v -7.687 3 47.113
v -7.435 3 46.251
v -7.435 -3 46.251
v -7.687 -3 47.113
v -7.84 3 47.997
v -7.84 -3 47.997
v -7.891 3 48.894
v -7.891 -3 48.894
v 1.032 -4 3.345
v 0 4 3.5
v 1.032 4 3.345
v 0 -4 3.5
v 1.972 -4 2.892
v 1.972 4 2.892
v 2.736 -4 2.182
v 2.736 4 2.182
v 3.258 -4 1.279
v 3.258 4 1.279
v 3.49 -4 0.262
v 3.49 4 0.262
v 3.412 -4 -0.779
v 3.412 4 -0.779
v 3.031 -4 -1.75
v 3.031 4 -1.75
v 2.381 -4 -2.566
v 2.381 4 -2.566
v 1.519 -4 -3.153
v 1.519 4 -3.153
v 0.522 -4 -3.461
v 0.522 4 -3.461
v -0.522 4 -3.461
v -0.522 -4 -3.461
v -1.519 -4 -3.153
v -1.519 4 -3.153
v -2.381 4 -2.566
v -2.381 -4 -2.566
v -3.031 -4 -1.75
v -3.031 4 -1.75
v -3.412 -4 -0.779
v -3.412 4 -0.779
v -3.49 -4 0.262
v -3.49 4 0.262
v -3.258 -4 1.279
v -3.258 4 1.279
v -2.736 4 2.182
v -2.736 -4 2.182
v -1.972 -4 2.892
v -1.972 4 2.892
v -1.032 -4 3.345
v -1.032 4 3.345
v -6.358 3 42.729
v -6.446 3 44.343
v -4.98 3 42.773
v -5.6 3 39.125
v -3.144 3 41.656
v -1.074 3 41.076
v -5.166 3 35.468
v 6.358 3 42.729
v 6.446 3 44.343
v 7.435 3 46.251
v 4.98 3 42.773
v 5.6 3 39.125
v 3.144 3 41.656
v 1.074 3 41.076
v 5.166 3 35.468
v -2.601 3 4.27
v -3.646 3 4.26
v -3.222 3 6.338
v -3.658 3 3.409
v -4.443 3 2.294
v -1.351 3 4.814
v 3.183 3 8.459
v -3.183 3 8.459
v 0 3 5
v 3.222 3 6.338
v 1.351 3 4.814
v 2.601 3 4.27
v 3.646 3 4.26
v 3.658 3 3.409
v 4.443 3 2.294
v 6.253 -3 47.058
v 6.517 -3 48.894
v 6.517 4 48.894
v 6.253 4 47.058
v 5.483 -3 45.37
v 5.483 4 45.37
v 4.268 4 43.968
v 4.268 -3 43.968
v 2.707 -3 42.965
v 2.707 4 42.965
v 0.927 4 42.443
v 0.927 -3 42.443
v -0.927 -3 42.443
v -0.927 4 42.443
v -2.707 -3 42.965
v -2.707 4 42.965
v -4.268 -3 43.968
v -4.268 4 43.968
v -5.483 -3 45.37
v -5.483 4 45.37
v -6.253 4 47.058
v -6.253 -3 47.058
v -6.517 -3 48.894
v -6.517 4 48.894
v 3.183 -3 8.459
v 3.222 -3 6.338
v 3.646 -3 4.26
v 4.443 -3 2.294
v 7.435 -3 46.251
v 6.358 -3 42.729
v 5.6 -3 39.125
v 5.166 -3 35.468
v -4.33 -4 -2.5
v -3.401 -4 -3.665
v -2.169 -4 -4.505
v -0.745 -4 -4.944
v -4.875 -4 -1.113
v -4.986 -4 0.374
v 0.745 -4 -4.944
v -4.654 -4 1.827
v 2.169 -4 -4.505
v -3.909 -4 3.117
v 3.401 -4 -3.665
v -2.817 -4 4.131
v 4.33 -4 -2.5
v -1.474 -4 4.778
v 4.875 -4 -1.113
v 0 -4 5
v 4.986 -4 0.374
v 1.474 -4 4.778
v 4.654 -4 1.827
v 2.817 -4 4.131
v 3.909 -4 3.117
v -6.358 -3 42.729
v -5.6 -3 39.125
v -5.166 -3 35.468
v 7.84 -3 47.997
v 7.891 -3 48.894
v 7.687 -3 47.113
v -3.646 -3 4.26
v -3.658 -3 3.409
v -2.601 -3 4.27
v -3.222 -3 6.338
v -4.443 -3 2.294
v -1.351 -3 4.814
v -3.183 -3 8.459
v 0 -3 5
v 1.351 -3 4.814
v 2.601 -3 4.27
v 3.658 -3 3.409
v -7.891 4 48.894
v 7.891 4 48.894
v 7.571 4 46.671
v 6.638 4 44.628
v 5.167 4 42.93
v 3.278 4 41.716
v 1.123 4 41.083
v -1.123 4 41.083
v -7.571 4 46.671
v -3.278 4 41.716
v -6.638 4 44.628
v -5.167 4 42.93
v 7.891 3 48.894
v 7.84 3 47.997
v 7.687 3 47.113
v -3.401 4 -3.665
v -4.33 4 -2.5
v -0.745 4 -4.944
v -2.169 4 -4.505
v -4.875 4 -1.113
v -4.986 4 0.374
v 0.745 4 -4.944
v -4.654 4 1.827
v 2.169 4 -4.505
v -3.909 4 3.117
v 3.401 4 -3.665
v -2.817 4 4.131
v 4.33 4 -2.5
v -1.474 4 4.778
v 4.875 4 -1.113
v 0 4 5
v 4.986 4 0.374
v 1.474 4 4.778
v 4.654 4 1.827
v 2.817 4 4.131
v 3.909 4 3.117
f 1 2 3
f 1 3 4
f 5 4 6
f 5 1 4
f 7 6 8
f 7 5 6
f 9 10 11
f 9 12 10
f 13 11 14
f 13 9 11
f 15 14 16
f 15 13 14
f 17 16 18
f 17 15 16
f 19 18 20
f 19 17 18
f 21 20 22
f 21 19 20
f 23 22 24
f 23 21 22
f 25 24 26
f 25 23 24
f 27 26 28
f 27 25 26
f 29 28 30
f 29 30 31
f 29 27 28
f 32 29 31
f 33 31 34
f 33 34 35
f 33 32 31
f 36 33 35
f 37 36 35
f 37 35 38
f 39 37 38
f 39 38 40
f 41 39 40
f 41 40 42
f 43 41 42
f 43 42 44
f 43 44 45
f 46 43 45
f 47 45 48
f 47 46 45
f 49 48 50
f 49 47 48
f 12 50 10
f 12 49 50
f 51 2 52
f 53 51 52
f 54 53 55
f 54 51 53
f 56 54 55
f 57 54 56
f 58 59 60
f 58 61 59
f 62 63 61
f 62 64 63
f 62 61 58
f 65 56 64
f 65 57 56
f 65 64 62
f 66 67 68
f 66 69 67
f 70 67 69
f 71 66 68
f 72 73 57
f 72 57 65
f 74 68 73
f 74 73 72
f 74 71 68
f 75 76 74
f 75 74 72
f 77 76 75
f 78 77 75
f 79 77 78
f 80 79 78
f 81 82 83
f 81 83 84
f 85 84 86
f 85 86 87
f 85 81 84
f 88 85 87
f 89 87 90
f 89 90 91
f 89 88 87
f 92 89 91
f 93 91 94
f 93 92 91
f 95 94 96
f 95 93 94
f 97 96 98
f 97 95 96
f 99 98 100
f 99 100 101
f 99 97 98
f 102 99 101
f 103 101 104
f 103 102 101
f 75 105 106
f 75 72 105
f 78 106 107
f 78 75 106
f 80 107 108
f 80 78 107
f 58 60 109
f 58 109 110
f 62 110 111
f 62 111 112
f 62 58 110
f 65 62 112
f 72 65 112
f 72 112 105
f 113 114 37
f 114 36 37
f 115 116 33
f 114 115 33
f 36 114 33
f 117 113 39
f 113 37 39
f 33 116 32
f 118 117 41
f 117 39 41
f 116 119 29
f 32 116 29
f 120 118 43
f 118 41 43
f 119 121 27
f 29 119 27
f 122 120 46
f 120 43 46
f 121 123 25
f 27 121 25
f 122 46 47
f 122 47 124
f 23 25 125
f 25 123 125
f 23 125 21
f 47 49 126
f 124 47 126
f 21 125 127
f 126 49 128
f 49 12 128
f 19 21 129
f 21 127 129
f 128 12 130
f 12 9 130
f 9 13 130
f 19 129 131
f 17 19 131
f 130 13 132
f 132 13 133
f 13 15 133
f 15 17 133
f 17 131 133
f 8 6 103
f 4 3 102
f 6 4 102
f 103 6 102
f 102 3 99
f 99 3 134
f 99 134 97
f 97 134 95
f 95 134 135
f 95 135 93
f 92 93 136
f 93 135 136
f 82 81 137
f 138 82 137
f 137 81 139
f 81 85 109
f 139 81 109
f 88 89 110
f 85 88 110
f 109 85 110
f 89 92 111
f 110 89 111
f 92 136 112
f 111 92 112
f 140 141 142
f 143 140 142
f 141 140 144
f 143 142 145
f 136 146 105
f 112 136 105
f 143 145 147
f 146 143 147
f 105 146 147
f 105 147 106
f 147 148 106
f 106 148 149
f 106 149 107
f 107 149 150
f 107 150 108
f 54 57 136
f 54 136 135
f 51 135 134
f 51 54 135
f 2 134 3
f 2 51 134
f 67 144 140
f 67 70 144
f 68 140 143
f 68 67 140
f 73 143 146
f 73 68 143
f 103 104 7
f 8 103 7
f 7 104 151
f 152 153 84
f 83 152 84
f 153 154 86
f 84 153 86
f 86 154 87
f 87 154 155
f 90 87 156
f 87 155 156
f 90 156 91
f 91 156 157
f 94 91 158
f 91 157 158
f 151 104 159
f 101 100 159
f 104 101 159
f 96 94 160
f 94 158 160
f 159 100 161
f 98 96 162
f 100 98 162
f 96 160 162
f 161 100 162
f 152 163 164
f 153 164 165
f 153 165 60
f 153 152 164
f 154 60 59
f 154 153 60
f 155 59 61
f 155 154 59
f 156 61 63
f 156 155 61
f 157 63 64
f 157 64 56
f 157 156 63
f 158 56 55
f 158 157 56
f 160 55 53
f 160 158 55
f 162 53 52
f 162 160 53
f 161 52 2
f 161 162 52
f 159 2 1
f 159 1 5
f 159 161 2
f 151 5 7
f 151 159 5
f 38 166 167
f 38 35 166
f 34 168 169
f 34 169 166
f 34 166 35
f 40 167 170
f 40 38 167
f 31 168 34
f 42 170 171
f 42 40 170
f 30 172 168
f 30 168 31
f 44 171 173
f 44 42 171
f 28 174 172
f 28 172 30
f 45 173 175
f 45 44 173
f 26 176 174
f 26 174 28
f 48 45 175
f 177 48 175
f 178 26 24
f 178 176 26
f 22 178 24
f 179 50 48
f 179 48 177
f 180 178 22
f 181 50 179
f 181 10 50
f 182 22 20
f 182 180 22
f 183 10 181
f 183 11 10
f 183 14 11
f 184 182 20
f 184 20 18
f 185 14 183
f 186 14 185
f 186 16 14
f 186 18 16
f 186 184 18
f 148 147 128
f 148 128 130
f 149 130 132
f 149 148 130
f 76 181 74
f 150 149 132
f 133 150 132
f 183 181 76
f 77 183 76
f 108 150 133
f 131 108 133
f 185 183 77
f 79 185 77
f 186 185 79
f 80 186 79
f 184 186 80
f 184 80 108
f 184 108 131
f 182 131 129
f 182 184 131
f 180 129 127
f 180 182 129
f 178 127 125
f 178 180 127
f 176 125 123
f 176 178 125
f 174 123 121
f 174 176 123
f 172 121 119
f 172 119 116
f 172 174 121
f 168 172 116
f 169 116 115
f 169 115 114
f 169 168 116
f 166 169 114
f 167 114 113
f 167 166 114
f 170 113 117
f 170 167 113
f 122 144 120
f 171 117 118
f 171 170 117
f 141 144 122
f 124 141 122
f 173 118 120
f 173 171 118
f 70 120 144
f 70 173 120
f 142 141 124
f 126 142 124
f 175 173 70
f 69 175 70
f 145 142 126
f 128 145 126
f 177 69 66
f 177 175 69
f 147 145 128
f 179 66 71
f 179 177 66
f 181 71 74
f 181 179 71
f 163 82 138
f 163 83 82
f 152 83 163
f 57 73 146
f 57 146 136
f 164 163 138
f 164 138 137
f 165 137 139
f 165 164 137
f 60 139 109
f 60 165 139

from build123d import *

# Parameters (mm, degrees)
SKETCH_1_R               = 5
SKETCH_1_R_2             = 3.5
EXTRUDE_1_DEPTH          = 4
EXTRUDE_2_DEPTH          = 3
CUT_EXTRUDE_1_DEPTH      = 51.018502827
CUT_EXTRUDE_1_DEPTH_BACK = 51.018502827
EXTRUDE_3_DEPTH          = 1


with BuildPart() as part:
    # 草图1 → 凸台-拉伸1 (new, symmetric)
    with BuildSketch(Plane(origin=(0, 0, 0), x_dir=(1, 0, 0), z_dir=(0, 1, 0))):
        Circle(SKETCH_1_R)
        Circle(SKETCH_1_R_2, mode=Mode.SUBTRACT)
    extrude(amount=EXTRUDE_1_DEPTH, both=True)

    # 草图3 → 凸台-拉伸2 (add, symmetric)
    with BuildSketch(Plane(origin=(0, 0, 0), x_dir=(1, 0, 0), z_dir=(0, 1, 0))):
        with BuildLine():
            ThreePointArc((-4.442907632, -2.293593637), (-3.386405493, -5.288949741), (-3.182744564, -8.45863067))
            Line((-3.182744564, -8.45863067), (-5.166007589, -35.46765597))
            ThreePointArc((-5.166007589, -35.46765597), (-5.938483862, -40.935577384), (-7.435049269, -46.251137201))
            ThreePointArc((-7.435049269, -46.251137201), (-7.775935141, -47.552891453), (-7.890676089, -48.893638195))
            Line((-7.890676089, -48.893638195), (7.890676089, -48.893638195))
            ThreePointArc((7.890676089, -48.893638195), (7.775935141, -47.552891453), (7.435049269, -46.251137201))
            ThreePointArc((7.435049269, -46.251137201), (5.938483862, -40.935577384), (5.166007589, -35.46765597))
            Line((5.166007589, -35.46765597), (3.182744564, -8.45863067))
            ThreePointArc((3.182744564, -8.45863067), (3.386405493, -5.288949741), (4.442907632, -2.293593637))
            ThreePointArc((4.442907632, -2.293593637), (0, -5), (-4.442907632, -2.293593637))
        make_face()
    extrude(amount=EXTRUDE_2_DEPTH, both=True)

    # 草图4 → 切除-拉伸1 (cut, two sides: drawn at the far end of the back side and taken through both)
    with BuildSketch(Plane(origin=(0, 3, 0), x_dir=(1, 0, 0), z_dir=(0, 1, 0)).offset(-CUT_EXTRUDE_1_DEPTH_BACK)):
        with BuildLine():
            Line((-6.517089491, -48.893638195), (6.517089491, -48.893638195))
            ThreePointArc((6.517089491, -48.893638195), (0, -42.376548704), (-6.517089491, -48.893638195))
        make_face()
    extrude(amount=CUT_EXTRUDE_1_DEPTH + CUT_EXTRUDE_1_DEPTH_BACK, mode=Mode.SUBTRACT)

    # 草图5 → 凸台-拉伸3 (add, symmetric)
    with BuildSketch(Plane(origin=(0, 3, 0), x_dir=(1, 0, 0), z_dir=(0, 1, 0))):
        with BuildLine():
            Line((-6.517089491, -48.893638195), (-7.890676089, -48.893638195))
            ThreePointArc((-7.890676089, -48.893638195), (0, -41.002962106), (7.890676089, -48.893638195))
            Line((7.890676089, -48.893638195), (6.517089491, -48.893638195))
            ThreePointArc((6.517089491, -48.893638195), (0, -42.376548704), (-6.517089491, -48.893638195))
        make_face()
    extrude(amount=EXTRUDE_3_DEPTH, both=True)


solid = part.part
